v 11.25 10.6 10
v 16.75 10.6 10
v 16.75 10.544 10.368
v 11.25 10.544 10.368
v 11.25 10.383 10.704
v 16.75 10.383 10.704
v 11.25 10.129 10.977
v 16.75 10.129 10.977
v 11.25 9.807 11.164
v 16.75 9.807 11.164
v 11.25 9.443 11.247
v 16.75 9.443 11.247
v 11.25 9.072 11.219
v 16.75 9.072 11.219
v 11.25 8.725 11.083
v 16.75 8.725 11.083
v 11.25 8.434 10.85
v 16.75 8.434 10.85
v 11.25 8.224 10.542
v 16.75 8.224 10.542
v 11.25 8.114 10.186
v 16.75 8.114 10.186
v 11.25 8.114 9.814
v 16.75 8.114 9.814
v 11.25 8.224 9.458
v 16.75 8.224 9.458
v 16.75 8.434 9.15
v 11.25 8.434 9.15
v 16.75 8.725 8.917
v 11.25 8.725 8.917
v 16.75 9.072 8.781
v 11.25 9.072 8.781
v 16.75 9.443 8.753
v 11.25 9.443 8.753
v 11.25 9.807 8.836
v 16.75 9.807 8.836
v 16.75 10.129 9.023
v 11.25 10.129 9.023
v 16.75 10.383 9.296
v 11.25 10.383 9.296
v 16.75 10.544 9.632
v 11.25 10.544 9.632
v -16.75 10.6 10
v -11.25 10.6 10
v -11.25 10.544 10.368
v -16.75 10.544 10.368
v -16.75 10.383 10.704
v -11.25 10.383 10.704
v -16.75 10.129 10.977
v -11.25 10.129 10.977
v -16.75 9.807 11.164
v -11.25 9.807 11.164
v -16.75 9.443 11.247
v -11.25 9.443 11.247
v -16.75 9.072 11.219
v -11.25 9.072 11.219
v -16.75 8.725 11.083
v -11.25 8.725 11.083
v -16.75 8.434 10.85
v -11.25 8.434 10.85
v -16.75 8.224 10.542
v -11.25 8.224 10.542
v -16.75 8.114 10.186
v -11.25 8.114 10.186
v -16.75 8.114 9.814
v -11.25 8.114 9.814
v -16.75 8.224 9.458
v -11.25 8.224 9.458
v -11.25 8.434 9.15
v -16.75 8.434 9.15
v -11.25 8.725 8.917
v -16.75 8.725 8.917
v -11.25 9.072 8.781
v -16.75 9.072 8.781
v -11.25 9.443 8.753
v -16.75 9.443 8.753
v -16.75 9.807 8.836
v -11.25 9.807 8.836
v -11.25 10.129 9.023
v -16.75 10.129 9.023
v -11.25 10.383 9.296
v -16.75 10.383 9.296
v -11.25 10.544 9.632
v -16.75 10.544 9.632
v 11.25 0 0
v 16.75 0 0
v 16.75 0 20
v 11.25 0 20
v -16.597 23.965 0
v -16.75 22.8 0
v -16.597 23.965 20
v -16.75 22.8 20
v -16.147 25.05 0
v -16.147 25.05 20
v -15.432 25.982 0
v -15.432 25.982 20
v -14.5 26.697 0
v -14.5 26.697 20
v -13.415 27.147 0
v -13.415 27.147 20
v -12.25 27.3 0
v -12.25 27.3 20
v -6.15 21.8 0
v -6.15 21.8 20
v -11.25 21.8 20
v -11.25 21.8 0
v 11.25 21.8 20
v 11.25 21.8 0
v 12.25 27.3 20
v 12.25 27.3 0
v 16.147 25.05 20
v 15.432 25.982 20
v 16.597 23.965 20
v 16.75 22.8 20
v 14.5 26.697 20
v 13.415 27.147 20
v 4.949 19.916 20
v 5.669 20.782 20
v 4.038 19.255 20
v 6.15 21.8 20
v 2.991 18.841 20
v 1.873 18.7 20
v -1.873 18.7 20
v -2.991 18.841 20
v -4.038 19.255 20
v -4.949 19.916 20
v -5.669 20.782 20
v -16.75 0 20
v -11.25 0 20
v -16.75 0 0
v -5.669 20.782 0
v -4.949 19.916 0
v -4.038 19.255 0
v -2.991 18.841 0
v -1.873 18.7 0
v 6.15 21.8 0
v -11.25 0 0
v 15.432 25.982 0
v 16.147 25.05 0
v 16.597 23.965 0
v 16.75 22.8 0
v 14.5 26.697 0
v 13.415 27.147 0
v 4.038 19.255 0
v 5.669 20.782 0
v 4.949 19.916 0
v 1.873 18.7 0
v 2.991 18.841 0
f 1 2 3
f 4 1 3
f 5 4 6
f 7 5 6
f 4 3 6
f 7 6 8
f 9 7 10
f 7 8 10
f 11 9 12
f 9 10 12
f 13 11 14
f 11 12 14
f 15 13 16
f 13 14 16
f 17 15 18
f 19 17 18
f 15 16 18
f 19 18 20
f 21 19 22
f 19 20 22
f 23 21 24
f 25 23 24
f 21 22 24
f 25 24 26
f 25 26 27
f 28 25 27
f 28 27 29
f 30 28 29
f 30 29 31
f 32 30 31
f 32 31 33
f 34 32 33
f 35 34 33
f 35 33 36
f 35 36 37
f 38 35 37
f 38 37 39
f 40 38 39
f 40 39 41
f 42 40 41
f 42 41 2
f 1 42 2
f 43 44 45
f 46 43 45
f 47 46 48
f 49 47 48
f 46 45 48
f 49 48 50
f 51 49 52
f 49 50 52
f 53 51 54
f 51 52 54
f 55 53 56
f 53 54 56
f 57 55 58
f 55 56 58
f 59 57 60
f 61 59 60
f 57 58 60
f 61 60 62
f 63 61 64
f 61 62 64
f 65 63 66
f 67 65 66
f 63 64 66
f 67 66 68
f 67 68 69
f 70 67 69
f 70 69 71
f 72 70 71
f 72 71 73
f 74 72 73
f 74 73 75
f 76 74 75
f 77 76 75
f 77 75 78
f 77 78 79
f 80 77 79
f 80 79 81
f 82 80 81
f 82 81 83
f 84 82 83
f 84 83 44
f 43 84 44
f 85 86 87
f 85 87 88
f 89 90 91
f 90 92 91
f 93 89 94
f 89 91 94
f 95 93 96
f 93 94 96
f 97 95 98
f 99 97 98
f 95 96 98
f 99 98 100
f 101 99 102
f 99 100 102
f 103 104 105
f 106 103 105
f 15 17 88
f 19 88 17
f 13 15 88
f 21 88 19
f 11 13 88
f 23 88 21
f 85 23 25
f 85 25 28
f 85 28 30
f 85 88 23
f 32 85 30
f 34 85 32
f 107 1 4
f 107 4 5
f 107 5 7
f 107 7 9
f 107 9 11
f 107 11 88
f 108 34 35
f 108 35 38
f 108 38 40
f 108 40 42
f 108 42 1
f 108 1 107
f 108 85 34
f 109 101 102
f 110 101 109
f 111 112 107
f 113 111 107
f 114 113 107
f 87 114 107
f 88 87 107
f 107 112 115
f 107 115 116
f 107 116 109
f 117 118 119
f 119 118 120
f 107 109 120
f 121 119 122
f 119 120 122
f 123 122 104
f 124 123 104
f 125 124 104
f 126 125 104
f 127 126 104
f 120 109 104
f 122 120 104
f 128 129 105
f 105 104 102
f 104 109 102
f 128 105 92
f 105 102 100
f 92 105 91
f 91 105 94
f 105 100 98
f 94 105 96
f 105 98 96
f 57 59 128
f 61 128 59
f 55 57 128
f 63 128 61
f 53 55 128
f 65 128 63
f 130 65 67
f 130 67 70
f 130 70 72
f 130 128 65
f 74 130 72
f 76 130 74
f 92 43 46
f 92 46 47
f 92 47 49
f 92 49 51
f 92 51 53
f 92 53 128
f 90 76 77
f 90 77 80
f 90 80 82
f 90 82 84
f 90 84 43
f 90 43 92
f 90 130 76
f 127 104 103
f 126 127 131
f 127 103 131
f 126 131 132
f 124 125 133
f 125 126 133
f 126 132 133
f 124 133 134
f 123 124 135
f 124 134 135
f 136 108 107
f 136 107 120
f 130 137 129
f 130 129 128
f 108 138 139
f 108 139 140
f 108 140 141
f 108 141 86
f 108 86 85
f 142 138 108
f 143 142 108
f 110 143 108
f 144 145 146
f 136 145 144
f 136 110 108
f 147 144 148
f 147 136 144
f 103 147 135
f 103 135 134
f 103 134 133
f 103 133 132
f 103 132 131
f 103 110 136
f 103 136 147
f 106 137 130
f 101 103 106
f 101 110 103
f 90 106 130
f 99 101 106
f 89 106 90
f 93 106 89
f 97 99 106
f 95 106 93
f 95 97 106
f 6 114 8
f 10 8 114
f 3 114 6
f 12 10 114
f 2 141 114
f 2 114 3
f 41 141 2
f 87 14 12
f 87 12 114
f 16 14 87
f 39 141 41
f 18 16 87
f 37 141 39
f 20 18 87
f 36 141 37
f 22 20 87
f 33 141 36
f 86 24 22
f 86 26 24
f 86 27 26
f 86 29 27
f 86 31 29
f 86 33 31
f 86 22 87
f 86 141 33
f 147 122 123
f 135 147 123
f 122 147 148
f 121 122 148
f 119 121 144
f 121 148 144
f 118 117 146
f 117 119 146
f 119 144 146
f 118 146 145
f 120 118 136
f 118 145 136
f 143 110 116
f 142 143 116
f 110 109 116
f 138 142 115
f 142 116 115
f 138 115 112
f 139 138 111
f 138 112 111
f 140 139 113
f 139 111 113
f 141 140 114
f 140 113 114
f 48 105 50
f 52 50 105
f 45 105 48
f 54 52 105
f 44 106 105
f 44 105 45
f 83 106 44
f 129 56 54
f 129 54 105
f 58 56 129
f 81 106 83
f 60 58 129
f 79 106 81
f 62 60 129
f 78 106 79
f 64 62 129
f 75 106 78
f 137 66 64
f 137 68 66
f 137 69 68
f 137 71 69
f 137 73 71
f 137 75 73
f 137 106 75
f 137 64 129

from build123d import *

# Parameters (mm, degrees)
BOSS_EXTRUDE1_DEPTH = 20
FILLET1_R           = 4.5
FILLET2_R           = 4.5
SKETCH2_R           = 1.25
CUT_EXTRUDE1_DEPTH  = 48.618693808


with BuildPart() as part:
    # Sketch1 → Boss-Extrude1 (new body)
    with BuildSketch(Plane.XY):
        Polygon((-16.75, 0), (-16.75, 27.3), (16.75, 27.3), (16.75, 0), (11.25, 0), (11.25, 21.8), (6.15, 21.8), (6.15, 18.7), (-6.15, 18.7), (-6.15, 21.8), (-11.25, 21.8), (-11.25, 0), align=None)
    extrude(amount=BOSS_EXTRUDE1_DEPTH)

    # Fillet1
    fillet1_edges = [part.edges().sort_by_distance(p)[0] for p in [
        (16.75, 27.3, 10),
        (-16.75, 27.3, 10),
    ]]
    fillet(fillet1_edges, radius=FILLET1_R)

    # Fillet2
    # the kernel refuses this fillet: 4.5 mm, written as the material it takes off along each edge
    with BuildSketch(Plane(origin=(-6.15, 18.7, -10.69170239), x_dir=(0, 1, 0), z_dir=(0, 0, 1))) as fillet2_piece_1:
        with BuildLine():
            CenterArc((4.5, -4.276680956), FILLET2_R, 108.126203961, 71.873796039)
            Line((0, -4.276680956), (-0.09, -4.276680956))
            Line((-0.09, -4.276680956), (-0.09, 0))
            Line((-0.09, 0), (0, 0.09))
            ThreePointArc((0, 0.09), (1.55, 0.09), (3.072, 0.085533619))
            Line((3.072, 0.085533619), (3.1, 0))
        make_face()
    extrude(amount=41.38340478, mode=Mode.SUBTRACT)
    with BuildSketch(Plane(origin=(6.15, 18.7, -10.69170239), x_dir=(-1, 0, 0), z_dir=(0, 0, 1))) as fillet2_piece_2:
        with BuildLine():
            CenterArc((4.276680956, -4.5), FILLET2_R, 90, 71.873796039)
            Line((0, -3.1), (-0.085533619, -3.072))
            ThreePointArc((-0.085533619, -3.072), (-0.09, -1.55), (-0.09, 0))
            Line((-0.09, 0), (0, 0.09))
            Line((0, 0.09), (4.276680956, 0.09))
            Line((4.276680956, 0.09), (4.276680956, 0))
        make_face()
    extrude(amount=41.38340478, mode=Mode.SUBTRACT)

    # Sketch2 → Cut-Extrude1 (cut, through all)
    with BuildSketch(Plane(origin=(16.75, 0, 0), x_dir=(0, 0, -1), z_dir=(1, 0, 0))):
        with Locations(Location((-10, 9.35, 0), (0, 0, 90))):
            Circle(SKETCH2_R)
    extrude(amount=-CUT_EXTRUDE1_DEPTH, mode=Mode.SUBTRACT)


solid = part.part
